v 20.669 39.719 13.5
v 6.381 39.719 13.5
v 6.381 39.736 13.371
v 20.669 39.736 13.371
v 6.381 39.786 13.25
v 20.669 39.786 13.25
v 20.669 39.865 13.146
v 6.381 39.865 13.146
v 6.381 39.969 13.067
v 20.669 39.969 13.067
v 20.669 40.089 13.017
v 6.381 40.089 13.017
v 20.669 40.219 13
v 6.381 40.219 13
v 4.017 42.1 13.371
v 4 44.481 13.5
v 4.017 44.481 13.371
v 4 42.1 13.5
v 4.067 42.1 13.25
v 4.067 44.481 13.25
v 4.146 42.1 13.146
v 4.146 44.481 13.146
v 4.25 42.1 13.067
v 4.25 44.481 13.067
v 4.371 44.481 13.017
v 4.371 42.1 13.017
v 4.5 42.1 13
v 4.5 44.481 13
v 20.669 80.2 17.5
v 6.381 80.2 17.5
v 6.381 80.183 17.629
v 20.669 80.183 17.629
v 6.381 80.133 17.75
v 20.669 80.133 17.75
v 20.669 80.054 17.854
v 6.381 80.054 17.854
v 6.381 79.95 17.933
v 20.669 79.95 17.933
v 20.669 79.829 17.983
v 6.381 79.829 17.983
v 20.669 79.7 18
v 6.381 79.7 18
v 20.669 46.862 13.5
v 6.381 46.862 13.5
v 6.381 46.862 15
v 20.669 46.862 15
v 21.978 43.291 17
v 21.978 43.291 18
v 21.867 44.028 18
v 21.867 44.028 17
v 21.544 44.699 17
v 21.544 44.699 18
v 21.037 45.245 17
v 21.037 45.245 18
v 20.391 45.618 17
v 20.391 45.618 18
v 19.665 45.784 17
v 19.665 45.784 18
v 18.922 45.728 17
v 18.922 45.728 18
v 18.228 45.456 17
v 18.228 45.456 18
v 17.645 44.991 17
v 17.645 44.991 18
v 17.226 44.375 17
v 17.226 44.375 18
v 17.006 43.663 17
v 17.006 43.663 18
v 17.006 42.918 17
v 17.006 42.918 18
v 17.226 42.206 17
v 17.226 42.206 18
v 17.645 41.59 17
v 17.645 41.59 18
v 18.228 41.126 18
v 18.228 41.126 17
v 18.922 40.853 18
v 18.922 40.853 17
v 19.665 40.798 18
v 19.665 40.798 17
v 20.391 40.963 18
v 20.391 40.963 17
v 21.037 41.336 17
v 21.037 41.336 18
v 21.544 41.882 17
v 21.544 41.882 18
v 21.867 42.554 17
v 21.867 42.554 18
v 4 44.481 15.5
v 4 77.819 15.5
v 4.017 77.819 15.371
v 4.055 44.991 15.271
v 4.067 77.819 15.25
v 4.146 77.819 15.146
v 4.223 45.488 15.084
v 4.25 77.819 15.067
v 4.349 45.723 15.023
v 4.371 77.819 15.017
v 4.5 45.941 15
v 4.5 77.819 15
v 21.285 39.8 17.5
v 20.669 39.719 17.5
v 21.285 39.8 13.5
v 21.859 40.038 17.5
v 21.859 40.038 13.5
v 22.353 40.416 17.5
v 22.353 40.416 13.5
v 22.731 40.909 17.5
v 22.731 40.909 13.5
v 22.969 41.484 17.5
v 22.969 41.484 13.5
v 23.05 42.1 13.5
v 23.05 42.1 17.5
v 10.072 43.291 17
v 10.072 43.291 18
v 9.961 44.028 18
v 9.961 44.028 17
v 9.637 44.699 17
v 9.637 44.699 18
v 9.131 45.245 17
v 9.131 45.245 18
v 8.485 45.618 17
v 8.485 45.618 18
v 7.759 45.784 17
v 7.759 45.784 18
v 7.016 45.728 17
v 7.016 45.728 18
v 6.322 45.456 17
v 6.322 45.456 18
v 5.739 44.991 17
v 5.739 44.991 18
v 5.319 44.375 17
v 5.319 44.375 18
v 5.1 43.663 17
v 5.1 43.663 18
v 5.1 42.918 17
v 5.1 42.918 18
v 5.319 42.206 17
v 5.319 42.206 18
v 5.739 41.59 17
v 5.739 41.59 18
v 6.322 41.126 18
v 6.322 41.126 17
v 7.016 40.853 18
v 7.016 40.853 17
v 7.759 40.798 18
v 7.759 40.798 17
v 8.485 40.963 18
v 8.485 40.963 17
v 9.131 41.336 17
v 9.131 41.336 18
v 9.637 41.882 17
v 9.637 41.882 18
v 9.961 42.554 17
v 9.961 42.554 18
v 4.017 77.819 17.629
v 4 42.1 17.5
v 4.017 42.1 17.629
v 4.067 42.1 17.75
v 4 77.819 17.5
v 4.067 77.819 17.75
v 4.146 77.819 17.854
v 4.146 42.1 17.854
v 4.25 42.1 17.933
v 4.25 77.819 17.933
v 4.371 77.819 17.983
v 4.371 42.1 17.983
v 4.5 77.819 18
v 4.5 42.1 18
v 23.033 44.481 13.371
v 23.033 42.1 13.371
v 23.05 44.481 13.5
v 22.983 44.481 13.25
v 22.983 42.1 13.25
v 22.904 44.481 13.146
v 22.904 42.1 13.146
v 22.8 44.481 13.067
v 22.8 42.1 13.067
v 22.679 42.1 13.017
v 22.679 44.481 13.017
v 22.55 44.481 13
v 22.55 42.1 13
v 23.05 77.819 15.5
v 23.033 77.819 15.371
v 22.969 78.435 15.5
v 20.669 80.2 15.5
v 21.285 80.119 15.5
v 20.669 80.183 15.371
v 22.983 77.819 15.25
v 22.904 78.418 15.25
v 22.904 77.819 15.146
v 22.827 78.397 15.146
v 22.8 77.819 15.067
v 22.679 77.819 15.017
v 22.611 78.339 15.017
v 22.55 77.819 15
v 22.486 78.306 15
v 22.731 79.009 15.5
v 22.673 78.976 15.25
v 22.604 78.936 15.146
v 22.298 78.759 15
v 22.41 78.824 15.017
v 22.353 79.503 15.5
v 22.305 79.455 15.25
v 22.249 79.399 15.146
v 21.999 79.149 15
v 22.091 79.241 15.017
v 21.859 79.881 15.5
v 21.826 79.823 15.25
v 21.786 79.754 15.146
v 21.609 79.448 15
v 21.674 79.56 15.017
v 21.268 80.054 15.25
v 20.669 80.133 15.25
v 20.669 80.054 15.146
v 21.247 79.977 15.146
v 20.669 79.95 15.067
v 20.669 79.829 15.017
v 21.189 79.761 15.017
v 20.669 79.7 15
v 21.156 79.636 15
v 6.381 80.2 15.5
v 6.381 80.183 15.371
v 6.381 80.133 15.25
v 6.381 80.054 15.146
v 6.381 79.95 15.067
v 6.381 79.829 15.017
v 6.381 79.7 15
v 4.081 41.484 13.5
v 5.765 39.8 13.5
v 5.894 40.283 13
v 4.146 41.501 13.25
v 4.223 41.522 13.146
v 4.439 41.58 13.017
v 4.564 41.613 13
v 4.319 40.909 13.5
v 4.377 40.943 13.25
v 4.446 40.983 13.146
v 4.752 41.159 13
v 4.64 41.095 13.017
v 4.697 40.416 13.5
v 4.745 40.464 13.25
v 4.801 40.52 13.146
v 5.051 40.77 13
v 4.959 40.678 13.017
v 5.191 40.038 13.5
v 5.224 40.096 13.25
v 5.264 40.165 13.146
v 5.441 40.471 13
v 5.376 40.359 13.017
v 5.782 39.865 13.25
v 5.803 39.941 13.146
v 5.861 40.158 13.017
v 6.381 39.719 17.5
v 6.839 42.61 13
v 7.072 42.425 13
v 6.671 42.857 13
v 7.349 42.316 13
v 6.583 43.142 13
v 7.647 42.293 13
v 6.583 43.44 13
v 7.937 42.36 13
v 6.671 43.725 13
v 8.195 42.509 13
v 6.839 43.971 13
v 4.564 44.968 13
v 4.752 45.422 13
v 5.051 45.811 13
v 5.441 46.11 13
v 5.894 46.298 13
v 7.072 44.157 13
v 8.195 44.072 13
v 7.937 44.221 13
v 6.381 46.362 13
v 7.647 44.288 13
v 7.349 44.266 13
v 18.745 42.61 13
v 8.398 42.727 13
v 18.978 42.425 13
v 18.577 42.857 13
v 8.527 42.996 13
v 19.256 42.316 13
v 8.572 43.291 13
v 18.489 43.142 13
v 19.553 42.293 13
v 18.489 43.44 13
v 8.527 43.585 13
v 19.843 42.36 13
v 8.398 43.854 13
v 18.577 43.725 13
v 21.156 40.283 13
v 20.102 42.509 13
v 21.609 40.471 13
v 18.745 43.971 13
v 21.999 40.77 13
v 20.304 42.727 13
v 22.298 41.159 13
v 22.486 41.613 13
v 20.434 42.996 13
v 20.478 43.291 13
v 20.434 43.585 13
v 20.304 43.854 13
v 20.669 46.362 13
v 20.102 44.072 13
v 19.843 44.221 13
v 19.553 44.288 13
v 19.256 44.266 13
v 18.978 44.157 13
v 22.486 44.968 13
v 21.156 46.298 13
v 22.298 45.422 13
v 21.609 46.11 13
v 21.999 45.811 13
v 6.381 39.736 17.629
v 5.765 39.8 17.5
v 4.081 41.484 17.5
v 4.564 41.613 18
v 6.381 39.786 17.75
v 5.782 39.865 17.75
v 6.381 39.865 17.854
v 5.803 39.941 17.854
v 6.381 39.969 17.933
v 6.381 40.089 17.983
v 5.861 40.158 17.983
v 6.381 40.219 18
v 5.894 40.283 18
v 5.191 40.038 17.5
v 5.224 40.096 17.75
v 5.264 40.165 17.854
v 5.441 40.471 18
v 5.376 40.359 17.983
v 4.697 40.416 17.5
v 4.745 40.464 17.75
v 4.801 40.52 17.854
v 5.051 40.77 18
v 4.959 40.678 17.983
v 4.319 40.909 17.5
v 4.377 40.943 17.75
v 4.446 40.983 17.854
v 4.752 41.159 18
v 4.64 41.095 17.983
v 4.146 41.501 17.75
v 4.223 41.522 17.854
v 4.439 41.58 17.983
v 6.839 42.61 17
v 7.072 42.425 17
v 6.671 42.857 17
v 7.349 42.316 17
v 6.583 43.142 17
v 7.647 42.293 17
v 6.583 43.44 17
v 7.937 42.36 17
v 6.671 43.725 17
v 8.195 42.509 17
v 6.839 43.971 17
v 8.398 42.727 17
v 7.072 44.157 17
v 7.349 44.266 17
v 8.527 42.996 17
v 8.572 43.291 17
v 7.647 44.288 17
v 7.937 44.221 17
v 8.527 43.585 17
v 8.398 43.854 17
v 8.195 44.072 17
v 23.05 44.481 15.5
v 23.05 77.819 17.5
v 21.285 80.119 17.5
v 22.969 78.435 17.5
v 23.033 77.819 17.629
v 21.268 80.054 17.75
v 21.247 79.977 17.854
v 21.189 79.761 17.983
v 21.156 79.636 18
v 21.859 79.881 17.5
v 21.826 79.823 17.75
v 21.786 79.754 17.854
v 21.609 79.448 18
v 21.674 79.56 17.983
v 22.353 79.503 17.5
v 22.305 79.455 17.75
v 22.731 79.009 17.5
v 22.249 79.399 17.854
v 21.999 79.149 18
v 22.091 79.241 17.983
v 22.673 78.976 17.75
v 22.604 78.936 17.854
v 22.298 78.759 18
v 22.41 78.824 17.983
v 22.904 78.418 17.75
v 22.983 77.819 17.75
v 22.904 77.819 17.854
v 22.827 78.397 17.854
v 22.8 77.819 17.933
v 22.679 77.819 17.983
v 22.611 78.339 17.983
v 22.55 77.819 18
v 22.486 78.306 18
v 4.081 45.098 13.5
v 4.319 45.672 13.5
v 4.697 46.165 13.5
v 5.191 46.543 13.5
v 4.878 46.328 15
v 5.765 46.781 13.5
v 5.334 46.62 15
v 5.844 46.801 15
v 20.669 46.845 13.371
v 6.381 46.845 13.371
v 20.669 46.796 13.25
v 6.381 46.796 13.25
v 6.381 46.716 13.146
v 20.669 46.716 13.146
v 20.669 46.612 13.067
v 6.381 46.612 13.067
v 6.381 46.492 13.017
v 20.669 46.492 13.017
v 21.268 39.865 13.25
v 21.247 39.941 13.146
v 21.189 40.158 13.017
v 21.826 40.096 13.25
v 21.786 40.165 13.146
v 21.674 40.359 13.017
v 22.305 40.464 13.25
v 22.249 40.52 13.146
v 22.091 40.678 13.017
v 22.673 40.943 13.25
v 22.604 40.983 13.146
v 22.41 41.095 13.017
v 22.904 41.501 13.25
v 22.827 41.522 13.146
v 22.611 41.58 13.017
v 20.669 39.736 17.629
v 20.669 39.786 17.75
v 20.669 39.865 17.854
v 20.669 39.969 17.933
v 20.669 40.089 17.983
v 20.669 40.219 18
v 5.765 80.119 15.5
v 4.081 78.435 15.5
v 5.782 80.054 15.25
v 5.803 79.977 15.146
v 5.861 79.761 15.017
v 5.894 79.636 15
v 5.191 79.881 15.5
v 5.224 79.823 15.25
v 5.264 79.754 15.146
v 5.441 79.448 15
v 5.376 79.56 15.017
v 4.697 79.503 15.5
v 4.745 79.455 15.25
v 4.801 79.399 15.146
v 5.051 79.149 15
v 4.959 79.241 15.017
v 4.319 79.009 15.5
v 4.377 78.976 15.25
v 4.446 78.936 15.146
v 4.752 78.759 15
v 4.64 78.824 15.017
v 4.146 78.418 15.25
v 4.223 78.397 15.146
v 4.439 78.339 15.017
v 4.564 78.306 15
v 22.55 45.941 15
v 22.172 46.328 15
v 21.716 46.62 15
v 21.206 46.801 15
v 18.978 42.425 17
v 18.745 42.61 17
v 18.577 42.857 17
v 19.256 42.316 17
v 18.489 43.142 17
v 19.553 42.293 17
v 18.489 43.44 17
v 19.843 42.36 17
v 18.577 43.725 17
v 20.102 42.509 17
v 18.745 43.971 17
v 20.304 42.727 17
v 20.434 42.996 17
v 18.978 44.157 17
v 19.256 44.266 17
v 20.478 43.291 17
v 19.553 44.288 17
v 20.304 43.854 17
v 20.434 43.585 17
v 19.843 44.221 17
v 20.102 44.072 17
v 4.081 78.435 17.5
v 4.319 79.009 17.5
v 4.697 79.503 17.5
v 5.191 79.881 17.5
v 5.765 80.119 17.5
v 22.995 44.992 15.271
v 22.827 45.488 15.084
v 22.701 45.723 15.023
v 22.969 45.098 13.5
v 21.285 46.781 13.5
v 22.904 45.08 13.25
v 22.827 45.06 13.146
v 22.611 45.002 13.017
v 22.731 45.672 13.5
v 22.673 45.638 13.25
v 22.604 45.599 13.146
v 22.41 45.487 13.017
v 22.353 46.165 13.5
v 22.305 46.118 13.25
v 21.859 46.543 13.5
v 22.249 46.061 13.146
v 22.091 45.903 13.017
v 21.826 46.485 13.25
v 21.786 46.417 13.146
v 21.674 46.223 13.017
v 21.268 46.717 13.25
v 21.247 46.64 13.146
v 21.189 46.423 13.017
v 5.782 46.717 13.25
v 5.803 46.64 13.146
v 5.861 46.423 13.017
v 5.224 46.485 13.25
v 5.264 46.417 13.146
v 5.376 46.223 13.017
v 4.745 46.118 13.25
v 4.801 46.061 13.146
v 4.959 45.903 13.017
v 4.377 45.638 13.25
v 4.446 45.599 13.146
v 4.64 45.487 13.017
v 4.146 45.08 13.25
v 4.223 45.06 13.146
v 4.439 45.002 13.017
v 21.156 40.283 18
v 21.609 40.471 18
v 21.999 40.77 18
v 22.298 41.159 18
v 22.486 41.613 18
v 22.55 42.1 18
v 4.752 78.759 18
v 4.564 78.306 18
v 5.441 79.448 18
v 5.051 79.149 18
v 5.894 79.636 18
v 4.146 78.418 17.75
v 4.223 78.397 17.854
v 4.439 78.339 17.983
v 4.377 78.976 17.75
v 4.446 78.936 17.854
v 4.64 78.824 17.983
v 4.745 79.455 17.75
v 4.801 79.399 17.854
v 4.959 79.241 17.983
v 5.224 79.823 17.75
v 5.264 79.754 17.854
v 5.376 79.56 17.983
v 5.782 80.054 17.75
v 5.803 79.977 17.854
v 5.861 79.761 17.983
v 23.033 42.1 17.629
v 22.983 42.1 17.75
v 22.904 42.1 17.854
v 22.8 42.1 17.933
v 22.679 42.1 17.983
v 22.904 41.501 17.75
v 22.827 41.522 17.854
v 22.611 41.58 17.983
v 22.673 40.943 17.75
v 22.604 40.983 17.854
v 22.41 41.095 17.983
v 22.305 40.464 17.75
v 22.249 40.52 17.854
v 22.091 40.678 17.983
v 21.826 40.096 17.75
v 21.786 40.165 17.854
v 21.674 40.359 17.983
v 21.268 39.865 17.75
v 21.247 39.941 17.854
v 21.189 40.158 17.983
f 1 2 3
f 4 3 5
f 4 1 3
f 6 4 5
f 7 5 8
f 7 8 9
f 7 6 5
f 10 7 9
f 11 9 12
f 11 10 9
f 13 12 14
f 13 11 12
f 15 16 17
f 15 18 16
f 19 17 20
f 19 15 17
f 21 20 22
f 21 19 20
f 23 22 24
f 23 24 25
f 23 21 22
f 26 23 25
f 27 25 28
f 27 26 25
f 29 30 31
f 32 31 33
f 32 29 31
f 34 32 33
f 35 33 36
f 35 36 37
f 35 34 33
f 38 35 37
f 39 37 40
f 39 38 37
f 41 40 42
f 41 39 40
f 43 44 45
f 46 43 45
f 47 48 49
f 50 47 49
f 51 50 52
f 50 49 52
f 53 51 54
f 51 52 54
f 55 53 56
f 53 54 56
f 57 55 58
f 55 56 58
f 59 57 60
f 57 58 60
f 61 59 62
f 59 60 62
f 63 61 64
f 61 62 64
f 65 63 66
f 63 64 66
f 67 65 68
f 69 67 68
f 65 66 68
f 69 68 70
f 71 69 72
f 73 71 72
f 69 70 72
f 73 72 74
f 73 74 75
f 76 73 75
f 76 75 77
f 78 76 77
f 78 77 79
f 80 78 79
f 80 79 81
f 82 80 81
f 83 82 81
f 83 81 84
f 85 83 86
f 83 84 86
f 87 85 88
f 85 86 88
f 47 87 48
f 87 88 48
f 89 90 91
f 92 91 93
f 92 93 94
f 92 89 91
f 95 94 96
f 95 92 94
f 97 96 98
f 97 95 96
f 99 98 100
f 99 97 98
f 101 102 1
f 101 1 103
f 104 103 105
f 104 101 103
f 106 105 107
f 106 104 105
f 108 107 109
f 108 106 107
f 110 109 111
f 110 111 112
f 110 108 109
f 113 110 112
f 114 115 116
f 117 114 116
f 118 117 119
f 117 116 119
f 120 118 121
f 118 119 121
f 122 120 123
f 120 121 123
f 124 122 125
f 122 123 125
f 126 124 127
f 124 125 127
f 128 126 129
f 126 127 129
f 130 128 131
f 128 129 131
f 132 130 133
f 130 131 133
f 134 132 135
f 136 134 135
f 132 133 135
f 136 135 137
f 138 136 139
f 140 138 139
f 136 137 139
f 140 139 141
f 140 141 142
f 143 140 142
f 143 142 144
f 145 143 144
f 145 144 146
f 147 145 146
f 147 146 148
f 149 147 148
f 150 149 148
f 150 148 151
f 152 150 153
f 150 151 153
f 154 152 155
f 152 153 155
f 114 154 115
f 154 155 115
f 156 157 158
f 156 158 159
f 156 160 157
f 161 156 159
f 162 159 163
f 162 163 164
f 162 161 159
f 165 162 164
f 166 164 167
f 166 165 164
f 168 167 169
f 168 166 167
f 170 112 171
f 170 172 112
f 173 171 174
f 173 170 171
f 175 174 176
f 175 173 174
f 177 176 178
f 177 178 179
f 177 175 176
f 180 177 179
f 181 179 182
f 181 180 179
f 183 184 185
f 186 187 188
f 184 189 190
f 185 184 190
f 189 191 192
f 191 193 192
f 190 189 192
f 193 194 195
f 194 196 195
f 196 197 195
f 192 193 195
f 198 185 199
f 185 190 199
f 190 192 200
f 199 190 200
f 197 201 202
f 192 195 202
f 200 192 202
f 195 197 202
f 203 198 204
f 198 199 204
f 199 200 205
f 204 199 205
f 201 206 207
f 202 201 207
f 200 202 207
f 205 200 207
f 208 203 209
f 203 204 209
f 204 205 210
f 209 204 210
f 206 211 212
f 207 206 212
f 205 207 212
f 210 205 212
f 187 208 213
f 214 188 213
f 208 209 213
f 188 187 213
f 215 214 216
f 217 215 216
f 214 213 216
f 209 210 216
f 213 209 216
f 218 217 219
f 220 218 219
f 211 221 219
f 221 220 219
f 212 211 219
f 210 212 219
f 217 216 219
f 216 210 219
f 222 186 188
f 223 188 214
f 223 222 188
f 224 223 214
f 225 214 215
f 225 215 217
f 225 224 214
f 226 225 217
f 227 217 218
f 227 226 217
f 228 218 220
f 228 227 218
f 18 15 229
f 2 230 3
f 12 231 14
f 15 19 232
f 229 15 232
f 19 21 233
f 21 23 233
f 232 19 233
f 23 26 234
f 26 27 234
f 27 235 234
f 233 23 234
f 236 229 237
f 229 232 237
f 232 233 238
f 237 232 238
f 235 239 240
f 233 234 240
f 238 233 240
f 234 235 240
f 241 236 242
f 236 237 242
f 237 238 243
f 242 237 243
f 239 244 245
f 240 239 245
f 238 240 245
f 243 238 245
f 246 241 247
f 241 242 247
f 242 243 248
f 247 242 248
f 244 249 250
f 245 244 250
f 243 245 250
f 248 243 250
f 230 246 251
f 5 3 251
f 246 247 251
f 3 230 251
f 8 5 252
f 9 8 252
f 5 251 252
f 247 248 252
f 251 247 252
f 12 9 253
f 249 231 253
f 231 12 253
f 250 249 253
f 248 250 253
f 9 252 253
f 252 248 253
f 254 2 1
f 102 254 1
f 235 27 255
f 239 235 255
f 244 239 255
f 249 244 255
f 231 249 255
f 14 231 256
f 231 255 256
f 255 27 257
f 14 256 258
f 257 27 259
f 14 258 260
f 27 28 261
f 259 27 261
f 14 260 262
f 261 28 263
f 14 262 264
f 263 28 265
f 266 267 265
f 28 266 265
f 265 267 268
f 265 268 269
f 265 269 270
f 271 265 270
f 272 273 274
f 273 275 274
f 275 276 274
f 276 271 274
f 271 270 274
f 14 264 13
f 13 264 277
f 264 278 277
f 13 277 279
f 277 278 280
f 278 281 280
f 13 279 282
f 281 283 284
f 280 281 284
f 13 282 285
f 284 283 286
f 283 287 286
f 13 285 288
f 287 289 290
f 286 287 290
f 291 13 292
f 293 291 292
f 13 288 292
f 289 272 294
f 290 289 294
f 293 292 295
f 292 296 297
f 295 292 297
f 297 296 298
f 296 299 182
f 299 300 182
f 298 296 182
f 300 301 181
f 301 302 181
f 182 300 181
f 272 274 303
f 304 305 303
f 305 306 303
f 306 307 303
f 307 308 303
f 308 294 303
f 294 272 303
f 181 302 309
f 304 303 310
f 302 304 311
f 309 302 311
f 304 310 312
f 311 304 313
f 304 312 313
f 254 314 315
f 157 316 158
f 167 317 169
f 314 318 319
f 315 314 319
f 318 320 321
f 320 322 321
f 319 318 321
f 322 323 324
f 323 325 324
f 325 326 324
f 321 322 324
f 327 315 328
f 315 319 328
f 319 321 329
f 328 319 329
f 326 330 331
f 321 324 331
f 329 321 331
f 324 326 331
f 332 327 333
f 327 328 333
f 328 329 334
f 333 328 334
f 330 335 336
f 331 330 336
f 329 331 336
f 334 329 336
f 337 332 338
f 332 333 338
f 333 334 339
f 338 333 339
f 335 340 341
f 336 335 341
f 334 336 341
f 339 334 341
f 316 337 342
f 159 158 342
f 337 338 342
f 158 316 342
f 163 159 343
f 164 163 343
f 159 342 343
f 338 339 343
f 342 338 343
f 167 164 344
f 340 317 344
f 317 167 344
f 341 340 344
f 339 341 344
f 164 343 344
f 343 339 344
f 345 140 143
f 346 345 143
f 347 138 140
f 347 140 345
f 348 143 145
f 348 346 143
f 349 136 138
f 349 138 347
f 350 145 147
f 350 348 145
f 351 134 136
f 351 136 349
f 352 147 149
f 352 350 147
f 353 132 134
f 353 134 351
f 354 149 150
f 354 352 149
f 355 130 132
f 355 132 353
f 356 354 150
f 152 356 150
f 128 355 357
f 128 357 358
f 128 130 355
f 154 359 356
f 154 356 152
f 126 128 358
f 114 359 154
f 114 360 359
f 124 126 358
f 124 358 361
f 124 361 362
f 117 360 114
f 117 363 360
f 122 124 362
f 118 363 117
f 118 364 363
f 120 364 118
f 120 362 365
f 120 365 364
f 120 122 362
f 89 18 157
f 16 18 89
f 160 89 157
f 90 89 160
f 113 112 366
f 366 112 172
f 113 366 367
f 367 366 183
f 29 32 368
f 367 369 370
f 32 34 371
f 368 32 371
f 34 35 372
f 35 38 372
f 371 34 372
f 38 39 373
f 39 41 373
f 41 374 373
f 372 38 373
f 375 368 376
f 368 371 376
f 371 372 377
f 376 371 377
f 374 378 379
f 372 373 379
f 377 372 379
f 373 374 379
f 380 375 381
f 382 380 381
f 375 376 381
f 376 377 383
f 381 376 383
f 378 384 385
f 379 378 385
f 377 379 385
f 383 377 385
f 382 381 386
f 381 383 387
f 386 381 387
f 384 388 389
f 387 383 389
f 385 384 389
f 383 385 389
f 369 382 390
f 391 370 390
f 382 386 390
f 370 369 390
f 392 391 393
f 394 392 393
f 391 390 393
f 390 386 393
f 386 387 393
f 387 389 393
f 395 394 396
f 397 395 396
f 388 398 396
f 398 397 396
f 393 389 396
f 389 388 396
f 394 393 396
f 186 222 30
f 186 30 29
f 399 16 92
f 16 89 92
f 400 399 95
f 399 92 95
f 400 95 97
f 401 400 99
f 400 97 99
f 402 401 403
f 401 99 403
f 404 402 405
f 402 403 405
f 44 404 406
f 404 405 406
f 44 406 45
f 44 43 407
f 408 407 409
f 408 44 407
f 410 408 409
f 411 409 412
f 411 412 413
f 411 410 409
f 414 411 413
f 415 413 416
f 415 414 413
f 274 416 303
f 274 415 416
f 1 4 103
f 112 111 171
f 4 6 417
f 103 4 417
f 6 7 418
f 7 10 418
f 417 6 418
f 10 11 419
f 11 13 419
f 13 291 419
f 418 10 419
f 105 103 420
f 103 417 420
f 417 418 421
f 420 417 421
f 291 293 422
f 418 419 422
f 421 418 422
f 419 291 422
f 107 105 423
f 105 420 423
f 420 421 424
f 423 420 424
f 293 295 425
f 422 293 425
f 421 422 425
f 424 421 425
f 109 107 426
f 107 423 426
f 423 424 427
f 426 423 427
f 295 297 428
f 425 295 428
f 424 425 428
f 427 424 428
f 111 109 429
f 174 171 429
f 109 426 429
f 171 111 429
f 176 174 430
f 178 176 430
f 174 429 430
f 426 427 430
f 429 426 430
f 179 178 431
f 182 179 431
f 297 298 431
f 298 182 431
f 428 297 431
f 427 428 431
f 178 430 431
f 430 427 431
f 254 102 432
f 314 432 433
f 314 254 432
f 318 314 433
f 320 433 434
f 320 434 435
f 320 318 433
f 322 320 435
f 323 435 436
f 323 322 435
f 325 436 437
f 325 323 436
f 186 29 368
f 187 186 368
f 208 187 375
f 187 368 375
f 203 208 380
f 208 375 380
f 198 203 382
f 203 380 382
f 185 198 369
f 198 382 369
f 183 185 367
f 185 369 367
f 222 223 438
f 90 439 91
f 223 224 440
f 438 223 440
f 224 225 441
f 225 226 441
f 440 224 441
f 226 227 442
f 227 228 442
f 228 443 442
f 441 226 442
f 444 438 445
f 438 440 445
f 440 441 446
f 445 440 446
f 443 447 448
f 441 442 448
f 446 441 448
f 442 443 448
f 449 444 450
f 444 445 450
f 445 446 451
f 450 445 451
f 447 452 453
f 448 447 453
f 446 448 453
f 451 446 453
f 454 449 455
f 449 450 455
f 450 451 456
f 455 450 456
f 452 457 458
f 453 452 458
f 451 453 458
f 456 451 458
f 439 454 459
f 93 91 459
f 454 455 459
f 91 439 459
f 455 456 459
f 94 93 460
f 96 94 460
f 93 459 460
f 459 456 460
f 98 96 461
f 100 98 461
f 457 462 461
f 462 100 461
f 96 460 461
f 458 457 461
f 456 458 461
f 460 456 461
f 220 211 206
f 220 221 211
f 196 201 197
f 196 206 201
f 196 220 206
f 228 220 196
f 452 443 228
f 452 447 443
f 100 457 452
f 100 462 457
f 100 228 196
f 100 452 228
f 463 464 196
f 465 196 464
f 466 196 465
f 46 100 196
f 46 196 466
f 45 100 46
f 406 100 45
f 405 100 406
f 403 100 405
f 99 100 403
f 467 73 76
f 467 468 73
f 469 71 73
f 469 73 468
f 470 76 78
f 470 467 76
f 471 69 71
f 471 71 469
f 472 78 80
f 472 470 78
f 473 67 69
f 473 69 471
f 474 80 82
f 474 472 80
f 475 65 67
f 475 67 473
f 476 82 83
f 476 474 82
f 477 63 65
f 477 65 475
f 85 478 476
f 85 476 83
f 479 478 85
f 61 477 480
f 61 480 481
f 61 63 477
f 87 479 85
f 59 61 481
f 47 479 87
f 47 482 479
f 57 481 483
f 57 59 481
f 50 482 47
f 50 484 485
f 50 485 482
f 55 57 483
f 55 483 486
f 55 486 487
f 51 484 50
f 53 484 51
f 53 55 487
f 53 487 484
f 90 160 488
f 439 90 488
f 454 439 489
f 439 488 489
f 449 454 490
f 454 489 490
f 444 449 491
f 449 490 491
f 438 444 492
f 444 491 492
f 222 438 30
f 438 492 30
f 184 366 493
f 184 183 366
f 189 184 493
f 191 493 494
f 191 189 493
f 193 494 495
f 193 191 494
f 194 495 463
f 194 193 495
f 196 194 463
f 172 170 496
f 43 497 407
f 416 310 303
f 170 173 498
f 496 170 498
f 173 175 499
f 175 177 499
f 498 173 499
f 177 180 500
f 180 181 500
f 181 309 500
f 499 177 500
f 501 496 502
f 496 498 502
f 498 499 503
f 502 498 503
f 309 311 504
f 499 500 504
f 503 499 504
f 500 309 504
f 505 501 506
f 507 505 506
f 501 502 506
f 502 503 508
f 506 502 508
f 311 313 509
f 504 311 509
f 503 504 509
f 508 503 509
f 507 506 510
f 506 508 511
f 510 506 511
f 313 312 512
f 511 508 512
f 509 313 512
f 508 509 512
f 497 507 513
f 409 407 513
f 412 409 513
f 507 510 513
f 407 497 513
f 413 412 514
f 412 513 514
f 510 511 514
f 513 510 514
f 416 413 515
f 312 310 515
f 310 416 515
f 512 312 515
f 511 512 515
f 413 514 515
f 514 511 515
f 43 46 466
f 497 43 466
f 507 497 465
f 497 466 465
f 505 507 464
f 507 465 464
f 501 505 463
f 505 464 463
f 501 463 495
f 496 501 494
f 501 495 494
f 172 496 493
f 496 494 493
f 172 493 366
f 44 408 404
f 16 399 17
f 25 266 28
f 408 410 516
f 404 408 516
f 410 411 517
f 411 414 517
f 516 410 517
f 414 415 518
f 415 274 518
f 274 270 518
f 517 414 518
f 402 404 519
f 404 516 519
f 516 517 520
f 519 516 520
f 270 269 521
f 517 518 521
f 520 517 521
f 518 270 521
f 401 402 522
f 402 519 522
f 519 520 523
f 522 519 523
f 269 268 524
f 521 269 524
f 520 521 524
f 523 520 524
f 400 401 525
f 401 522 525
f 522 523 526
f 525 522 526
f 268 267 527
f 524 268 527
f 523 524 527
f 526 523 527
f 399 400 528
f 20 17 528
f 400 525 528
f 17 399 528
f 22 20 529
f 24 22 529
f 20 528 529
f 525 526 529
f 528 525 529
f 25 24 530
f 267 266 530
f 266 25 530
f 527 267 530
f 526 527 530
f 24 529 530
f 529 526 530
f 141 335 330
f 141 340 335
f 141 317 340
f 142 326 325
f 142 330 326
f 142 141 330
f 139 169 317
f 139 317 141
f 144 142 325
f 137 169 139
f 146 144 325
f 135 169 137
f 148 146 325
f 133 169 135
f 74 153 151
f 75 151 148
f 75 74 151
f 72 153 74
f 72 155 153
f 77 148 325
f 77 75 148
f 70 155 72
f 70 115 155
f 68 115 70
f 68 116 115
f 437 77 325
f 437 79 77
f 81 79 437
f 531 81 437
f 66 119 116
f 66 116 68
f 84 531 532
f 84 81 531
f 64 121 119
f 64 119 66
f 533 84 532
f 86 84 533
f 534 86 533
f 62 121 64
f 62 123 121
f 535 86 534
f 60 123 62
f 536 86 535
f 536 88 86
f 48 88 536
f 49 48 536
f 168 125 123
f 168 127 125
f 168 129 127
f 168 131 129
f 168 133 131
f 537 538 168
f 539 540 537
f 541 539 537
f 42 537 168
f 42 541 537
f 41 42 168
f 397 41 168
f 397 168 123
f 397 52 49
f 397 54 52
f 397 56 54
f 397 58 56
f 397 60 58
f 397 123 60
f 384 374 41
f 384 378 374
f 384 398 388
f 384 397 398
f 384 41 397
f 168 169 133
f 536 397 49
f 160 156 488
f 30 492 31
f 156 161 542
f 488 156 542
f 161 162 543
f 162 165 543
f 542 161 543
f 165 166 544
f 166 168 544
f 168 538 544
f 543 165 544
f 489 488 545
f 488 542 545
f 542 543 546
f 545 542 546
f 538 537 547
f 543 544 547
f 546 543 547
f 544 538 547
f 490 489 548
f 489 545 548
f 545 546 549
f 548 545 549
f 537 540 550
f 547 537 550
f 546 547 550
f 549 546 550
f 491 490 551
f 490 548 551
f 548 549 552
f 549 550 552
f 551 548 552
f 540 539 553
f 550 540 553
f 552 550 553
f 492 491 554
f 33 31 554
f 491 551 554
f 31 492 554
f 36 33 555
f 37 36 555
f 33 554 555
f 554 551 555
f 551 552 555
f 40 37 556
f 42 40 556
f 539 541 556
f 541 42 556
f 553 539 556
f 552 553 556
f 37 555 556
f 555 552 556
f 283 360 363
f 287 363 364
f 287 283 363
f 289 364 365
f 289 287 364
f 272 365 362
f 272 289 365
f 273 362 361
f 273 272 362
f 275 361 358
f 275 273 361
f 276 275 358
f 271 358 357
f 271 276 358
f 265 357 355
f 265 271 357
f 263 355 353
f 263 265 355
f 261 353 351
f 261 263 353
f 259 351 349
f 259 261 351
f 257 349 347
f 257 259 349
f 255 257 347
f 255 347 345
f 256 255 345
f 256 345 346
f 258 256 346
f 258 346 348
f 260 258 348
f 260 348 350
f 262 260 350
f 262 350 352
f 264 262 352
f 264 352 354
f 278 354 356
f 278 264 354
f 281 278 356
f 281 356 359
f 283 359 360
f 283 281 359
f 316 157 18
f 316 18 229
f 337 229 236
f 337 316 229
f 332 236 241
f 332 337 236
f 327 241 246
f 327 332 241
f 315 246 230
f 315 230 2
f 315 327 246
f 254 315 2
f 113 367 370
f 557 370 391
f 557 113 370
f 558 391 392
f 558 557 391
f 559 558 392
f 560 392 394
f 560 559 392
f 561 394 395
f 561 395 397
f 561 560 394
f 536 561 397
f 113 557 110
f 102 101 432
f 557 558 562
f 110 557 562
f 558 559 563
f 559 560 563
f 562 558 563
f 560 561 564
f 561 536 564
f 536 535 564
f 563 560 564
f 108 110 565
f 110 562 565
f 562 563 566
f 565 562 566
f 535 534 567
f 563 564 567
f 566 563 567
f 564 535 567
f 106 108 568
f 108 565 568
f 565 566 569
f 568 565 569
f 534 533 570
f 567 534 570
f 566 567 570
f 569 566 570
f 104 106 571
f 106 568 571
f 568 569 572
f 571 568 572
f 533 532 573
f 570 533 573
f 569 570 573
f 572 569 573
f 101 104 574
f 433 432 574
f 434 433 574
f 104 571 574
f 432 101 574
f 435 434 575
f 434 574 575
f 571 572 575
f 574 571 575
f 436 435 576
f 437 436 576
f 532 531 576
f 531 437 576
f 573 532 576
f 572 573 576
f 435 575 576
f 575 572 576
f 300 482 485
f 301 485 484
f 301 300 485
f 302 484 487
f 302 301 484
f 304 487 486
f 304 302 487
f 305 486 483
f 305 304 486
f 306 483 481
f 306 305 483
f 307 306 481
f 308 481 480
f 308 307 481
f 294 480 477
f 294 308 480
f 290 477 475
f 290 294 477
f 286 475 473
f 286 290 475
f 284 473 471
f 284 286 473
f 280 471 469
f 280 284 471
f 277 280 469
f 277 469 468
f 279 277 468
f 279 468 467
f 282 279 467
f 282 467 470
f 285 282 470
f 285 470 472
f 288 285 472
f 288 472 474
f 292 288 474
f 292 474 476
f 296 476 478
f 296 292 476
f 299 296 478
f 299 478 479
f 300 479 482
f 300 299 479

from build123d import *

# Parameters (mm, degrees)
SKETCH007_W     = 19.05
SKETCH007_H     = 40.48125
SKETCH007_R     = 1
PAD002_DEPTH    = 5
SKETCH008_W     = 33.3375
SKETCH008_H     = 2
POCKET006_DEPTH = 19.051
SKETCH009_R     = 2.5
POCKET007_DEPTH = 1
FILLET006_R     = 2.38125
FILLET007_R     = 0.5


with BuildPart() as part:
    # Sketch007 → Pad002 (new body)
    with BuildSketch(Plane.XY):
        with Locations((9.525, 55.959375)):
            Rectangle(SKETCH007_W, SKETCH007_H)
        with Locations((3.571875, 39.290625)):
            Circle(SKETCH007_R, mode=Mode.SUBTRACT)
        with Locations((15.478125, 39.290625)):
            Circle(SKETCH007_R, mode=Mode.SUBTRACT)
    extrude(amount=PAD002_DEPTH)

    # Sketch008 (on Face3 of Pad002) → Pocket006 (cut, through all)
    with BuildSketch(Plane(origin=(0, 0, 0), x_dir=(0, -1, 0), z_dir=(-1, 0, 0))):
        with Locations((-59.53125, 1)):
            Rectangle(SKETCH008_W, SKETCH008_H)
    extrude(amount=-POCKET006_DEPTH, mode=Mode.SUBTRACT)

    # Sketch009 (on Face6 of Pocket006) → Pocket007 (cut)
    with BuildSketch(Plane.XY.offset(5)):
        with Locations((3.571875, 39.290625)):
            Circle(SKETCH009_R)
        with Locations((15.478125, 39.290625)):
            Circle(SKETCH009_R)
    extrude(amount=-POCKET007_DEPTH, mode=Mode.SUBTRACT)

    # Fillet006
    fillet006_edges = [part.edges().sort_by_distance(p)[0] for p in [
        (0, 76.2, 3.5),
        (0, 35.71875, 2.5),
        (19.05, 35.71875, 2.5),
        (19.05, 76.2, 3.5),
        (19.05, 42.8625, 1),
        (0, 42.8625, 1),
    ]]
    fillet(fillet006_edges, radius=FILLET006_R)

    # Fillet007
    fillet007_edges = [part.edges().sort_by_distance(p)[0] for p in [
        (0, 58.340625, 2),
        (9.525, 35.71875, 0),
        (0, 55.959375, 5),
    ]]
    fillet(fillet007_edges, radius=FILLET007_R)


with BuildPart() as part_1:
    # Body002 placement: moved
    add(part.part.moved(Location((4, 4, 13))))


solid = part_1.part
